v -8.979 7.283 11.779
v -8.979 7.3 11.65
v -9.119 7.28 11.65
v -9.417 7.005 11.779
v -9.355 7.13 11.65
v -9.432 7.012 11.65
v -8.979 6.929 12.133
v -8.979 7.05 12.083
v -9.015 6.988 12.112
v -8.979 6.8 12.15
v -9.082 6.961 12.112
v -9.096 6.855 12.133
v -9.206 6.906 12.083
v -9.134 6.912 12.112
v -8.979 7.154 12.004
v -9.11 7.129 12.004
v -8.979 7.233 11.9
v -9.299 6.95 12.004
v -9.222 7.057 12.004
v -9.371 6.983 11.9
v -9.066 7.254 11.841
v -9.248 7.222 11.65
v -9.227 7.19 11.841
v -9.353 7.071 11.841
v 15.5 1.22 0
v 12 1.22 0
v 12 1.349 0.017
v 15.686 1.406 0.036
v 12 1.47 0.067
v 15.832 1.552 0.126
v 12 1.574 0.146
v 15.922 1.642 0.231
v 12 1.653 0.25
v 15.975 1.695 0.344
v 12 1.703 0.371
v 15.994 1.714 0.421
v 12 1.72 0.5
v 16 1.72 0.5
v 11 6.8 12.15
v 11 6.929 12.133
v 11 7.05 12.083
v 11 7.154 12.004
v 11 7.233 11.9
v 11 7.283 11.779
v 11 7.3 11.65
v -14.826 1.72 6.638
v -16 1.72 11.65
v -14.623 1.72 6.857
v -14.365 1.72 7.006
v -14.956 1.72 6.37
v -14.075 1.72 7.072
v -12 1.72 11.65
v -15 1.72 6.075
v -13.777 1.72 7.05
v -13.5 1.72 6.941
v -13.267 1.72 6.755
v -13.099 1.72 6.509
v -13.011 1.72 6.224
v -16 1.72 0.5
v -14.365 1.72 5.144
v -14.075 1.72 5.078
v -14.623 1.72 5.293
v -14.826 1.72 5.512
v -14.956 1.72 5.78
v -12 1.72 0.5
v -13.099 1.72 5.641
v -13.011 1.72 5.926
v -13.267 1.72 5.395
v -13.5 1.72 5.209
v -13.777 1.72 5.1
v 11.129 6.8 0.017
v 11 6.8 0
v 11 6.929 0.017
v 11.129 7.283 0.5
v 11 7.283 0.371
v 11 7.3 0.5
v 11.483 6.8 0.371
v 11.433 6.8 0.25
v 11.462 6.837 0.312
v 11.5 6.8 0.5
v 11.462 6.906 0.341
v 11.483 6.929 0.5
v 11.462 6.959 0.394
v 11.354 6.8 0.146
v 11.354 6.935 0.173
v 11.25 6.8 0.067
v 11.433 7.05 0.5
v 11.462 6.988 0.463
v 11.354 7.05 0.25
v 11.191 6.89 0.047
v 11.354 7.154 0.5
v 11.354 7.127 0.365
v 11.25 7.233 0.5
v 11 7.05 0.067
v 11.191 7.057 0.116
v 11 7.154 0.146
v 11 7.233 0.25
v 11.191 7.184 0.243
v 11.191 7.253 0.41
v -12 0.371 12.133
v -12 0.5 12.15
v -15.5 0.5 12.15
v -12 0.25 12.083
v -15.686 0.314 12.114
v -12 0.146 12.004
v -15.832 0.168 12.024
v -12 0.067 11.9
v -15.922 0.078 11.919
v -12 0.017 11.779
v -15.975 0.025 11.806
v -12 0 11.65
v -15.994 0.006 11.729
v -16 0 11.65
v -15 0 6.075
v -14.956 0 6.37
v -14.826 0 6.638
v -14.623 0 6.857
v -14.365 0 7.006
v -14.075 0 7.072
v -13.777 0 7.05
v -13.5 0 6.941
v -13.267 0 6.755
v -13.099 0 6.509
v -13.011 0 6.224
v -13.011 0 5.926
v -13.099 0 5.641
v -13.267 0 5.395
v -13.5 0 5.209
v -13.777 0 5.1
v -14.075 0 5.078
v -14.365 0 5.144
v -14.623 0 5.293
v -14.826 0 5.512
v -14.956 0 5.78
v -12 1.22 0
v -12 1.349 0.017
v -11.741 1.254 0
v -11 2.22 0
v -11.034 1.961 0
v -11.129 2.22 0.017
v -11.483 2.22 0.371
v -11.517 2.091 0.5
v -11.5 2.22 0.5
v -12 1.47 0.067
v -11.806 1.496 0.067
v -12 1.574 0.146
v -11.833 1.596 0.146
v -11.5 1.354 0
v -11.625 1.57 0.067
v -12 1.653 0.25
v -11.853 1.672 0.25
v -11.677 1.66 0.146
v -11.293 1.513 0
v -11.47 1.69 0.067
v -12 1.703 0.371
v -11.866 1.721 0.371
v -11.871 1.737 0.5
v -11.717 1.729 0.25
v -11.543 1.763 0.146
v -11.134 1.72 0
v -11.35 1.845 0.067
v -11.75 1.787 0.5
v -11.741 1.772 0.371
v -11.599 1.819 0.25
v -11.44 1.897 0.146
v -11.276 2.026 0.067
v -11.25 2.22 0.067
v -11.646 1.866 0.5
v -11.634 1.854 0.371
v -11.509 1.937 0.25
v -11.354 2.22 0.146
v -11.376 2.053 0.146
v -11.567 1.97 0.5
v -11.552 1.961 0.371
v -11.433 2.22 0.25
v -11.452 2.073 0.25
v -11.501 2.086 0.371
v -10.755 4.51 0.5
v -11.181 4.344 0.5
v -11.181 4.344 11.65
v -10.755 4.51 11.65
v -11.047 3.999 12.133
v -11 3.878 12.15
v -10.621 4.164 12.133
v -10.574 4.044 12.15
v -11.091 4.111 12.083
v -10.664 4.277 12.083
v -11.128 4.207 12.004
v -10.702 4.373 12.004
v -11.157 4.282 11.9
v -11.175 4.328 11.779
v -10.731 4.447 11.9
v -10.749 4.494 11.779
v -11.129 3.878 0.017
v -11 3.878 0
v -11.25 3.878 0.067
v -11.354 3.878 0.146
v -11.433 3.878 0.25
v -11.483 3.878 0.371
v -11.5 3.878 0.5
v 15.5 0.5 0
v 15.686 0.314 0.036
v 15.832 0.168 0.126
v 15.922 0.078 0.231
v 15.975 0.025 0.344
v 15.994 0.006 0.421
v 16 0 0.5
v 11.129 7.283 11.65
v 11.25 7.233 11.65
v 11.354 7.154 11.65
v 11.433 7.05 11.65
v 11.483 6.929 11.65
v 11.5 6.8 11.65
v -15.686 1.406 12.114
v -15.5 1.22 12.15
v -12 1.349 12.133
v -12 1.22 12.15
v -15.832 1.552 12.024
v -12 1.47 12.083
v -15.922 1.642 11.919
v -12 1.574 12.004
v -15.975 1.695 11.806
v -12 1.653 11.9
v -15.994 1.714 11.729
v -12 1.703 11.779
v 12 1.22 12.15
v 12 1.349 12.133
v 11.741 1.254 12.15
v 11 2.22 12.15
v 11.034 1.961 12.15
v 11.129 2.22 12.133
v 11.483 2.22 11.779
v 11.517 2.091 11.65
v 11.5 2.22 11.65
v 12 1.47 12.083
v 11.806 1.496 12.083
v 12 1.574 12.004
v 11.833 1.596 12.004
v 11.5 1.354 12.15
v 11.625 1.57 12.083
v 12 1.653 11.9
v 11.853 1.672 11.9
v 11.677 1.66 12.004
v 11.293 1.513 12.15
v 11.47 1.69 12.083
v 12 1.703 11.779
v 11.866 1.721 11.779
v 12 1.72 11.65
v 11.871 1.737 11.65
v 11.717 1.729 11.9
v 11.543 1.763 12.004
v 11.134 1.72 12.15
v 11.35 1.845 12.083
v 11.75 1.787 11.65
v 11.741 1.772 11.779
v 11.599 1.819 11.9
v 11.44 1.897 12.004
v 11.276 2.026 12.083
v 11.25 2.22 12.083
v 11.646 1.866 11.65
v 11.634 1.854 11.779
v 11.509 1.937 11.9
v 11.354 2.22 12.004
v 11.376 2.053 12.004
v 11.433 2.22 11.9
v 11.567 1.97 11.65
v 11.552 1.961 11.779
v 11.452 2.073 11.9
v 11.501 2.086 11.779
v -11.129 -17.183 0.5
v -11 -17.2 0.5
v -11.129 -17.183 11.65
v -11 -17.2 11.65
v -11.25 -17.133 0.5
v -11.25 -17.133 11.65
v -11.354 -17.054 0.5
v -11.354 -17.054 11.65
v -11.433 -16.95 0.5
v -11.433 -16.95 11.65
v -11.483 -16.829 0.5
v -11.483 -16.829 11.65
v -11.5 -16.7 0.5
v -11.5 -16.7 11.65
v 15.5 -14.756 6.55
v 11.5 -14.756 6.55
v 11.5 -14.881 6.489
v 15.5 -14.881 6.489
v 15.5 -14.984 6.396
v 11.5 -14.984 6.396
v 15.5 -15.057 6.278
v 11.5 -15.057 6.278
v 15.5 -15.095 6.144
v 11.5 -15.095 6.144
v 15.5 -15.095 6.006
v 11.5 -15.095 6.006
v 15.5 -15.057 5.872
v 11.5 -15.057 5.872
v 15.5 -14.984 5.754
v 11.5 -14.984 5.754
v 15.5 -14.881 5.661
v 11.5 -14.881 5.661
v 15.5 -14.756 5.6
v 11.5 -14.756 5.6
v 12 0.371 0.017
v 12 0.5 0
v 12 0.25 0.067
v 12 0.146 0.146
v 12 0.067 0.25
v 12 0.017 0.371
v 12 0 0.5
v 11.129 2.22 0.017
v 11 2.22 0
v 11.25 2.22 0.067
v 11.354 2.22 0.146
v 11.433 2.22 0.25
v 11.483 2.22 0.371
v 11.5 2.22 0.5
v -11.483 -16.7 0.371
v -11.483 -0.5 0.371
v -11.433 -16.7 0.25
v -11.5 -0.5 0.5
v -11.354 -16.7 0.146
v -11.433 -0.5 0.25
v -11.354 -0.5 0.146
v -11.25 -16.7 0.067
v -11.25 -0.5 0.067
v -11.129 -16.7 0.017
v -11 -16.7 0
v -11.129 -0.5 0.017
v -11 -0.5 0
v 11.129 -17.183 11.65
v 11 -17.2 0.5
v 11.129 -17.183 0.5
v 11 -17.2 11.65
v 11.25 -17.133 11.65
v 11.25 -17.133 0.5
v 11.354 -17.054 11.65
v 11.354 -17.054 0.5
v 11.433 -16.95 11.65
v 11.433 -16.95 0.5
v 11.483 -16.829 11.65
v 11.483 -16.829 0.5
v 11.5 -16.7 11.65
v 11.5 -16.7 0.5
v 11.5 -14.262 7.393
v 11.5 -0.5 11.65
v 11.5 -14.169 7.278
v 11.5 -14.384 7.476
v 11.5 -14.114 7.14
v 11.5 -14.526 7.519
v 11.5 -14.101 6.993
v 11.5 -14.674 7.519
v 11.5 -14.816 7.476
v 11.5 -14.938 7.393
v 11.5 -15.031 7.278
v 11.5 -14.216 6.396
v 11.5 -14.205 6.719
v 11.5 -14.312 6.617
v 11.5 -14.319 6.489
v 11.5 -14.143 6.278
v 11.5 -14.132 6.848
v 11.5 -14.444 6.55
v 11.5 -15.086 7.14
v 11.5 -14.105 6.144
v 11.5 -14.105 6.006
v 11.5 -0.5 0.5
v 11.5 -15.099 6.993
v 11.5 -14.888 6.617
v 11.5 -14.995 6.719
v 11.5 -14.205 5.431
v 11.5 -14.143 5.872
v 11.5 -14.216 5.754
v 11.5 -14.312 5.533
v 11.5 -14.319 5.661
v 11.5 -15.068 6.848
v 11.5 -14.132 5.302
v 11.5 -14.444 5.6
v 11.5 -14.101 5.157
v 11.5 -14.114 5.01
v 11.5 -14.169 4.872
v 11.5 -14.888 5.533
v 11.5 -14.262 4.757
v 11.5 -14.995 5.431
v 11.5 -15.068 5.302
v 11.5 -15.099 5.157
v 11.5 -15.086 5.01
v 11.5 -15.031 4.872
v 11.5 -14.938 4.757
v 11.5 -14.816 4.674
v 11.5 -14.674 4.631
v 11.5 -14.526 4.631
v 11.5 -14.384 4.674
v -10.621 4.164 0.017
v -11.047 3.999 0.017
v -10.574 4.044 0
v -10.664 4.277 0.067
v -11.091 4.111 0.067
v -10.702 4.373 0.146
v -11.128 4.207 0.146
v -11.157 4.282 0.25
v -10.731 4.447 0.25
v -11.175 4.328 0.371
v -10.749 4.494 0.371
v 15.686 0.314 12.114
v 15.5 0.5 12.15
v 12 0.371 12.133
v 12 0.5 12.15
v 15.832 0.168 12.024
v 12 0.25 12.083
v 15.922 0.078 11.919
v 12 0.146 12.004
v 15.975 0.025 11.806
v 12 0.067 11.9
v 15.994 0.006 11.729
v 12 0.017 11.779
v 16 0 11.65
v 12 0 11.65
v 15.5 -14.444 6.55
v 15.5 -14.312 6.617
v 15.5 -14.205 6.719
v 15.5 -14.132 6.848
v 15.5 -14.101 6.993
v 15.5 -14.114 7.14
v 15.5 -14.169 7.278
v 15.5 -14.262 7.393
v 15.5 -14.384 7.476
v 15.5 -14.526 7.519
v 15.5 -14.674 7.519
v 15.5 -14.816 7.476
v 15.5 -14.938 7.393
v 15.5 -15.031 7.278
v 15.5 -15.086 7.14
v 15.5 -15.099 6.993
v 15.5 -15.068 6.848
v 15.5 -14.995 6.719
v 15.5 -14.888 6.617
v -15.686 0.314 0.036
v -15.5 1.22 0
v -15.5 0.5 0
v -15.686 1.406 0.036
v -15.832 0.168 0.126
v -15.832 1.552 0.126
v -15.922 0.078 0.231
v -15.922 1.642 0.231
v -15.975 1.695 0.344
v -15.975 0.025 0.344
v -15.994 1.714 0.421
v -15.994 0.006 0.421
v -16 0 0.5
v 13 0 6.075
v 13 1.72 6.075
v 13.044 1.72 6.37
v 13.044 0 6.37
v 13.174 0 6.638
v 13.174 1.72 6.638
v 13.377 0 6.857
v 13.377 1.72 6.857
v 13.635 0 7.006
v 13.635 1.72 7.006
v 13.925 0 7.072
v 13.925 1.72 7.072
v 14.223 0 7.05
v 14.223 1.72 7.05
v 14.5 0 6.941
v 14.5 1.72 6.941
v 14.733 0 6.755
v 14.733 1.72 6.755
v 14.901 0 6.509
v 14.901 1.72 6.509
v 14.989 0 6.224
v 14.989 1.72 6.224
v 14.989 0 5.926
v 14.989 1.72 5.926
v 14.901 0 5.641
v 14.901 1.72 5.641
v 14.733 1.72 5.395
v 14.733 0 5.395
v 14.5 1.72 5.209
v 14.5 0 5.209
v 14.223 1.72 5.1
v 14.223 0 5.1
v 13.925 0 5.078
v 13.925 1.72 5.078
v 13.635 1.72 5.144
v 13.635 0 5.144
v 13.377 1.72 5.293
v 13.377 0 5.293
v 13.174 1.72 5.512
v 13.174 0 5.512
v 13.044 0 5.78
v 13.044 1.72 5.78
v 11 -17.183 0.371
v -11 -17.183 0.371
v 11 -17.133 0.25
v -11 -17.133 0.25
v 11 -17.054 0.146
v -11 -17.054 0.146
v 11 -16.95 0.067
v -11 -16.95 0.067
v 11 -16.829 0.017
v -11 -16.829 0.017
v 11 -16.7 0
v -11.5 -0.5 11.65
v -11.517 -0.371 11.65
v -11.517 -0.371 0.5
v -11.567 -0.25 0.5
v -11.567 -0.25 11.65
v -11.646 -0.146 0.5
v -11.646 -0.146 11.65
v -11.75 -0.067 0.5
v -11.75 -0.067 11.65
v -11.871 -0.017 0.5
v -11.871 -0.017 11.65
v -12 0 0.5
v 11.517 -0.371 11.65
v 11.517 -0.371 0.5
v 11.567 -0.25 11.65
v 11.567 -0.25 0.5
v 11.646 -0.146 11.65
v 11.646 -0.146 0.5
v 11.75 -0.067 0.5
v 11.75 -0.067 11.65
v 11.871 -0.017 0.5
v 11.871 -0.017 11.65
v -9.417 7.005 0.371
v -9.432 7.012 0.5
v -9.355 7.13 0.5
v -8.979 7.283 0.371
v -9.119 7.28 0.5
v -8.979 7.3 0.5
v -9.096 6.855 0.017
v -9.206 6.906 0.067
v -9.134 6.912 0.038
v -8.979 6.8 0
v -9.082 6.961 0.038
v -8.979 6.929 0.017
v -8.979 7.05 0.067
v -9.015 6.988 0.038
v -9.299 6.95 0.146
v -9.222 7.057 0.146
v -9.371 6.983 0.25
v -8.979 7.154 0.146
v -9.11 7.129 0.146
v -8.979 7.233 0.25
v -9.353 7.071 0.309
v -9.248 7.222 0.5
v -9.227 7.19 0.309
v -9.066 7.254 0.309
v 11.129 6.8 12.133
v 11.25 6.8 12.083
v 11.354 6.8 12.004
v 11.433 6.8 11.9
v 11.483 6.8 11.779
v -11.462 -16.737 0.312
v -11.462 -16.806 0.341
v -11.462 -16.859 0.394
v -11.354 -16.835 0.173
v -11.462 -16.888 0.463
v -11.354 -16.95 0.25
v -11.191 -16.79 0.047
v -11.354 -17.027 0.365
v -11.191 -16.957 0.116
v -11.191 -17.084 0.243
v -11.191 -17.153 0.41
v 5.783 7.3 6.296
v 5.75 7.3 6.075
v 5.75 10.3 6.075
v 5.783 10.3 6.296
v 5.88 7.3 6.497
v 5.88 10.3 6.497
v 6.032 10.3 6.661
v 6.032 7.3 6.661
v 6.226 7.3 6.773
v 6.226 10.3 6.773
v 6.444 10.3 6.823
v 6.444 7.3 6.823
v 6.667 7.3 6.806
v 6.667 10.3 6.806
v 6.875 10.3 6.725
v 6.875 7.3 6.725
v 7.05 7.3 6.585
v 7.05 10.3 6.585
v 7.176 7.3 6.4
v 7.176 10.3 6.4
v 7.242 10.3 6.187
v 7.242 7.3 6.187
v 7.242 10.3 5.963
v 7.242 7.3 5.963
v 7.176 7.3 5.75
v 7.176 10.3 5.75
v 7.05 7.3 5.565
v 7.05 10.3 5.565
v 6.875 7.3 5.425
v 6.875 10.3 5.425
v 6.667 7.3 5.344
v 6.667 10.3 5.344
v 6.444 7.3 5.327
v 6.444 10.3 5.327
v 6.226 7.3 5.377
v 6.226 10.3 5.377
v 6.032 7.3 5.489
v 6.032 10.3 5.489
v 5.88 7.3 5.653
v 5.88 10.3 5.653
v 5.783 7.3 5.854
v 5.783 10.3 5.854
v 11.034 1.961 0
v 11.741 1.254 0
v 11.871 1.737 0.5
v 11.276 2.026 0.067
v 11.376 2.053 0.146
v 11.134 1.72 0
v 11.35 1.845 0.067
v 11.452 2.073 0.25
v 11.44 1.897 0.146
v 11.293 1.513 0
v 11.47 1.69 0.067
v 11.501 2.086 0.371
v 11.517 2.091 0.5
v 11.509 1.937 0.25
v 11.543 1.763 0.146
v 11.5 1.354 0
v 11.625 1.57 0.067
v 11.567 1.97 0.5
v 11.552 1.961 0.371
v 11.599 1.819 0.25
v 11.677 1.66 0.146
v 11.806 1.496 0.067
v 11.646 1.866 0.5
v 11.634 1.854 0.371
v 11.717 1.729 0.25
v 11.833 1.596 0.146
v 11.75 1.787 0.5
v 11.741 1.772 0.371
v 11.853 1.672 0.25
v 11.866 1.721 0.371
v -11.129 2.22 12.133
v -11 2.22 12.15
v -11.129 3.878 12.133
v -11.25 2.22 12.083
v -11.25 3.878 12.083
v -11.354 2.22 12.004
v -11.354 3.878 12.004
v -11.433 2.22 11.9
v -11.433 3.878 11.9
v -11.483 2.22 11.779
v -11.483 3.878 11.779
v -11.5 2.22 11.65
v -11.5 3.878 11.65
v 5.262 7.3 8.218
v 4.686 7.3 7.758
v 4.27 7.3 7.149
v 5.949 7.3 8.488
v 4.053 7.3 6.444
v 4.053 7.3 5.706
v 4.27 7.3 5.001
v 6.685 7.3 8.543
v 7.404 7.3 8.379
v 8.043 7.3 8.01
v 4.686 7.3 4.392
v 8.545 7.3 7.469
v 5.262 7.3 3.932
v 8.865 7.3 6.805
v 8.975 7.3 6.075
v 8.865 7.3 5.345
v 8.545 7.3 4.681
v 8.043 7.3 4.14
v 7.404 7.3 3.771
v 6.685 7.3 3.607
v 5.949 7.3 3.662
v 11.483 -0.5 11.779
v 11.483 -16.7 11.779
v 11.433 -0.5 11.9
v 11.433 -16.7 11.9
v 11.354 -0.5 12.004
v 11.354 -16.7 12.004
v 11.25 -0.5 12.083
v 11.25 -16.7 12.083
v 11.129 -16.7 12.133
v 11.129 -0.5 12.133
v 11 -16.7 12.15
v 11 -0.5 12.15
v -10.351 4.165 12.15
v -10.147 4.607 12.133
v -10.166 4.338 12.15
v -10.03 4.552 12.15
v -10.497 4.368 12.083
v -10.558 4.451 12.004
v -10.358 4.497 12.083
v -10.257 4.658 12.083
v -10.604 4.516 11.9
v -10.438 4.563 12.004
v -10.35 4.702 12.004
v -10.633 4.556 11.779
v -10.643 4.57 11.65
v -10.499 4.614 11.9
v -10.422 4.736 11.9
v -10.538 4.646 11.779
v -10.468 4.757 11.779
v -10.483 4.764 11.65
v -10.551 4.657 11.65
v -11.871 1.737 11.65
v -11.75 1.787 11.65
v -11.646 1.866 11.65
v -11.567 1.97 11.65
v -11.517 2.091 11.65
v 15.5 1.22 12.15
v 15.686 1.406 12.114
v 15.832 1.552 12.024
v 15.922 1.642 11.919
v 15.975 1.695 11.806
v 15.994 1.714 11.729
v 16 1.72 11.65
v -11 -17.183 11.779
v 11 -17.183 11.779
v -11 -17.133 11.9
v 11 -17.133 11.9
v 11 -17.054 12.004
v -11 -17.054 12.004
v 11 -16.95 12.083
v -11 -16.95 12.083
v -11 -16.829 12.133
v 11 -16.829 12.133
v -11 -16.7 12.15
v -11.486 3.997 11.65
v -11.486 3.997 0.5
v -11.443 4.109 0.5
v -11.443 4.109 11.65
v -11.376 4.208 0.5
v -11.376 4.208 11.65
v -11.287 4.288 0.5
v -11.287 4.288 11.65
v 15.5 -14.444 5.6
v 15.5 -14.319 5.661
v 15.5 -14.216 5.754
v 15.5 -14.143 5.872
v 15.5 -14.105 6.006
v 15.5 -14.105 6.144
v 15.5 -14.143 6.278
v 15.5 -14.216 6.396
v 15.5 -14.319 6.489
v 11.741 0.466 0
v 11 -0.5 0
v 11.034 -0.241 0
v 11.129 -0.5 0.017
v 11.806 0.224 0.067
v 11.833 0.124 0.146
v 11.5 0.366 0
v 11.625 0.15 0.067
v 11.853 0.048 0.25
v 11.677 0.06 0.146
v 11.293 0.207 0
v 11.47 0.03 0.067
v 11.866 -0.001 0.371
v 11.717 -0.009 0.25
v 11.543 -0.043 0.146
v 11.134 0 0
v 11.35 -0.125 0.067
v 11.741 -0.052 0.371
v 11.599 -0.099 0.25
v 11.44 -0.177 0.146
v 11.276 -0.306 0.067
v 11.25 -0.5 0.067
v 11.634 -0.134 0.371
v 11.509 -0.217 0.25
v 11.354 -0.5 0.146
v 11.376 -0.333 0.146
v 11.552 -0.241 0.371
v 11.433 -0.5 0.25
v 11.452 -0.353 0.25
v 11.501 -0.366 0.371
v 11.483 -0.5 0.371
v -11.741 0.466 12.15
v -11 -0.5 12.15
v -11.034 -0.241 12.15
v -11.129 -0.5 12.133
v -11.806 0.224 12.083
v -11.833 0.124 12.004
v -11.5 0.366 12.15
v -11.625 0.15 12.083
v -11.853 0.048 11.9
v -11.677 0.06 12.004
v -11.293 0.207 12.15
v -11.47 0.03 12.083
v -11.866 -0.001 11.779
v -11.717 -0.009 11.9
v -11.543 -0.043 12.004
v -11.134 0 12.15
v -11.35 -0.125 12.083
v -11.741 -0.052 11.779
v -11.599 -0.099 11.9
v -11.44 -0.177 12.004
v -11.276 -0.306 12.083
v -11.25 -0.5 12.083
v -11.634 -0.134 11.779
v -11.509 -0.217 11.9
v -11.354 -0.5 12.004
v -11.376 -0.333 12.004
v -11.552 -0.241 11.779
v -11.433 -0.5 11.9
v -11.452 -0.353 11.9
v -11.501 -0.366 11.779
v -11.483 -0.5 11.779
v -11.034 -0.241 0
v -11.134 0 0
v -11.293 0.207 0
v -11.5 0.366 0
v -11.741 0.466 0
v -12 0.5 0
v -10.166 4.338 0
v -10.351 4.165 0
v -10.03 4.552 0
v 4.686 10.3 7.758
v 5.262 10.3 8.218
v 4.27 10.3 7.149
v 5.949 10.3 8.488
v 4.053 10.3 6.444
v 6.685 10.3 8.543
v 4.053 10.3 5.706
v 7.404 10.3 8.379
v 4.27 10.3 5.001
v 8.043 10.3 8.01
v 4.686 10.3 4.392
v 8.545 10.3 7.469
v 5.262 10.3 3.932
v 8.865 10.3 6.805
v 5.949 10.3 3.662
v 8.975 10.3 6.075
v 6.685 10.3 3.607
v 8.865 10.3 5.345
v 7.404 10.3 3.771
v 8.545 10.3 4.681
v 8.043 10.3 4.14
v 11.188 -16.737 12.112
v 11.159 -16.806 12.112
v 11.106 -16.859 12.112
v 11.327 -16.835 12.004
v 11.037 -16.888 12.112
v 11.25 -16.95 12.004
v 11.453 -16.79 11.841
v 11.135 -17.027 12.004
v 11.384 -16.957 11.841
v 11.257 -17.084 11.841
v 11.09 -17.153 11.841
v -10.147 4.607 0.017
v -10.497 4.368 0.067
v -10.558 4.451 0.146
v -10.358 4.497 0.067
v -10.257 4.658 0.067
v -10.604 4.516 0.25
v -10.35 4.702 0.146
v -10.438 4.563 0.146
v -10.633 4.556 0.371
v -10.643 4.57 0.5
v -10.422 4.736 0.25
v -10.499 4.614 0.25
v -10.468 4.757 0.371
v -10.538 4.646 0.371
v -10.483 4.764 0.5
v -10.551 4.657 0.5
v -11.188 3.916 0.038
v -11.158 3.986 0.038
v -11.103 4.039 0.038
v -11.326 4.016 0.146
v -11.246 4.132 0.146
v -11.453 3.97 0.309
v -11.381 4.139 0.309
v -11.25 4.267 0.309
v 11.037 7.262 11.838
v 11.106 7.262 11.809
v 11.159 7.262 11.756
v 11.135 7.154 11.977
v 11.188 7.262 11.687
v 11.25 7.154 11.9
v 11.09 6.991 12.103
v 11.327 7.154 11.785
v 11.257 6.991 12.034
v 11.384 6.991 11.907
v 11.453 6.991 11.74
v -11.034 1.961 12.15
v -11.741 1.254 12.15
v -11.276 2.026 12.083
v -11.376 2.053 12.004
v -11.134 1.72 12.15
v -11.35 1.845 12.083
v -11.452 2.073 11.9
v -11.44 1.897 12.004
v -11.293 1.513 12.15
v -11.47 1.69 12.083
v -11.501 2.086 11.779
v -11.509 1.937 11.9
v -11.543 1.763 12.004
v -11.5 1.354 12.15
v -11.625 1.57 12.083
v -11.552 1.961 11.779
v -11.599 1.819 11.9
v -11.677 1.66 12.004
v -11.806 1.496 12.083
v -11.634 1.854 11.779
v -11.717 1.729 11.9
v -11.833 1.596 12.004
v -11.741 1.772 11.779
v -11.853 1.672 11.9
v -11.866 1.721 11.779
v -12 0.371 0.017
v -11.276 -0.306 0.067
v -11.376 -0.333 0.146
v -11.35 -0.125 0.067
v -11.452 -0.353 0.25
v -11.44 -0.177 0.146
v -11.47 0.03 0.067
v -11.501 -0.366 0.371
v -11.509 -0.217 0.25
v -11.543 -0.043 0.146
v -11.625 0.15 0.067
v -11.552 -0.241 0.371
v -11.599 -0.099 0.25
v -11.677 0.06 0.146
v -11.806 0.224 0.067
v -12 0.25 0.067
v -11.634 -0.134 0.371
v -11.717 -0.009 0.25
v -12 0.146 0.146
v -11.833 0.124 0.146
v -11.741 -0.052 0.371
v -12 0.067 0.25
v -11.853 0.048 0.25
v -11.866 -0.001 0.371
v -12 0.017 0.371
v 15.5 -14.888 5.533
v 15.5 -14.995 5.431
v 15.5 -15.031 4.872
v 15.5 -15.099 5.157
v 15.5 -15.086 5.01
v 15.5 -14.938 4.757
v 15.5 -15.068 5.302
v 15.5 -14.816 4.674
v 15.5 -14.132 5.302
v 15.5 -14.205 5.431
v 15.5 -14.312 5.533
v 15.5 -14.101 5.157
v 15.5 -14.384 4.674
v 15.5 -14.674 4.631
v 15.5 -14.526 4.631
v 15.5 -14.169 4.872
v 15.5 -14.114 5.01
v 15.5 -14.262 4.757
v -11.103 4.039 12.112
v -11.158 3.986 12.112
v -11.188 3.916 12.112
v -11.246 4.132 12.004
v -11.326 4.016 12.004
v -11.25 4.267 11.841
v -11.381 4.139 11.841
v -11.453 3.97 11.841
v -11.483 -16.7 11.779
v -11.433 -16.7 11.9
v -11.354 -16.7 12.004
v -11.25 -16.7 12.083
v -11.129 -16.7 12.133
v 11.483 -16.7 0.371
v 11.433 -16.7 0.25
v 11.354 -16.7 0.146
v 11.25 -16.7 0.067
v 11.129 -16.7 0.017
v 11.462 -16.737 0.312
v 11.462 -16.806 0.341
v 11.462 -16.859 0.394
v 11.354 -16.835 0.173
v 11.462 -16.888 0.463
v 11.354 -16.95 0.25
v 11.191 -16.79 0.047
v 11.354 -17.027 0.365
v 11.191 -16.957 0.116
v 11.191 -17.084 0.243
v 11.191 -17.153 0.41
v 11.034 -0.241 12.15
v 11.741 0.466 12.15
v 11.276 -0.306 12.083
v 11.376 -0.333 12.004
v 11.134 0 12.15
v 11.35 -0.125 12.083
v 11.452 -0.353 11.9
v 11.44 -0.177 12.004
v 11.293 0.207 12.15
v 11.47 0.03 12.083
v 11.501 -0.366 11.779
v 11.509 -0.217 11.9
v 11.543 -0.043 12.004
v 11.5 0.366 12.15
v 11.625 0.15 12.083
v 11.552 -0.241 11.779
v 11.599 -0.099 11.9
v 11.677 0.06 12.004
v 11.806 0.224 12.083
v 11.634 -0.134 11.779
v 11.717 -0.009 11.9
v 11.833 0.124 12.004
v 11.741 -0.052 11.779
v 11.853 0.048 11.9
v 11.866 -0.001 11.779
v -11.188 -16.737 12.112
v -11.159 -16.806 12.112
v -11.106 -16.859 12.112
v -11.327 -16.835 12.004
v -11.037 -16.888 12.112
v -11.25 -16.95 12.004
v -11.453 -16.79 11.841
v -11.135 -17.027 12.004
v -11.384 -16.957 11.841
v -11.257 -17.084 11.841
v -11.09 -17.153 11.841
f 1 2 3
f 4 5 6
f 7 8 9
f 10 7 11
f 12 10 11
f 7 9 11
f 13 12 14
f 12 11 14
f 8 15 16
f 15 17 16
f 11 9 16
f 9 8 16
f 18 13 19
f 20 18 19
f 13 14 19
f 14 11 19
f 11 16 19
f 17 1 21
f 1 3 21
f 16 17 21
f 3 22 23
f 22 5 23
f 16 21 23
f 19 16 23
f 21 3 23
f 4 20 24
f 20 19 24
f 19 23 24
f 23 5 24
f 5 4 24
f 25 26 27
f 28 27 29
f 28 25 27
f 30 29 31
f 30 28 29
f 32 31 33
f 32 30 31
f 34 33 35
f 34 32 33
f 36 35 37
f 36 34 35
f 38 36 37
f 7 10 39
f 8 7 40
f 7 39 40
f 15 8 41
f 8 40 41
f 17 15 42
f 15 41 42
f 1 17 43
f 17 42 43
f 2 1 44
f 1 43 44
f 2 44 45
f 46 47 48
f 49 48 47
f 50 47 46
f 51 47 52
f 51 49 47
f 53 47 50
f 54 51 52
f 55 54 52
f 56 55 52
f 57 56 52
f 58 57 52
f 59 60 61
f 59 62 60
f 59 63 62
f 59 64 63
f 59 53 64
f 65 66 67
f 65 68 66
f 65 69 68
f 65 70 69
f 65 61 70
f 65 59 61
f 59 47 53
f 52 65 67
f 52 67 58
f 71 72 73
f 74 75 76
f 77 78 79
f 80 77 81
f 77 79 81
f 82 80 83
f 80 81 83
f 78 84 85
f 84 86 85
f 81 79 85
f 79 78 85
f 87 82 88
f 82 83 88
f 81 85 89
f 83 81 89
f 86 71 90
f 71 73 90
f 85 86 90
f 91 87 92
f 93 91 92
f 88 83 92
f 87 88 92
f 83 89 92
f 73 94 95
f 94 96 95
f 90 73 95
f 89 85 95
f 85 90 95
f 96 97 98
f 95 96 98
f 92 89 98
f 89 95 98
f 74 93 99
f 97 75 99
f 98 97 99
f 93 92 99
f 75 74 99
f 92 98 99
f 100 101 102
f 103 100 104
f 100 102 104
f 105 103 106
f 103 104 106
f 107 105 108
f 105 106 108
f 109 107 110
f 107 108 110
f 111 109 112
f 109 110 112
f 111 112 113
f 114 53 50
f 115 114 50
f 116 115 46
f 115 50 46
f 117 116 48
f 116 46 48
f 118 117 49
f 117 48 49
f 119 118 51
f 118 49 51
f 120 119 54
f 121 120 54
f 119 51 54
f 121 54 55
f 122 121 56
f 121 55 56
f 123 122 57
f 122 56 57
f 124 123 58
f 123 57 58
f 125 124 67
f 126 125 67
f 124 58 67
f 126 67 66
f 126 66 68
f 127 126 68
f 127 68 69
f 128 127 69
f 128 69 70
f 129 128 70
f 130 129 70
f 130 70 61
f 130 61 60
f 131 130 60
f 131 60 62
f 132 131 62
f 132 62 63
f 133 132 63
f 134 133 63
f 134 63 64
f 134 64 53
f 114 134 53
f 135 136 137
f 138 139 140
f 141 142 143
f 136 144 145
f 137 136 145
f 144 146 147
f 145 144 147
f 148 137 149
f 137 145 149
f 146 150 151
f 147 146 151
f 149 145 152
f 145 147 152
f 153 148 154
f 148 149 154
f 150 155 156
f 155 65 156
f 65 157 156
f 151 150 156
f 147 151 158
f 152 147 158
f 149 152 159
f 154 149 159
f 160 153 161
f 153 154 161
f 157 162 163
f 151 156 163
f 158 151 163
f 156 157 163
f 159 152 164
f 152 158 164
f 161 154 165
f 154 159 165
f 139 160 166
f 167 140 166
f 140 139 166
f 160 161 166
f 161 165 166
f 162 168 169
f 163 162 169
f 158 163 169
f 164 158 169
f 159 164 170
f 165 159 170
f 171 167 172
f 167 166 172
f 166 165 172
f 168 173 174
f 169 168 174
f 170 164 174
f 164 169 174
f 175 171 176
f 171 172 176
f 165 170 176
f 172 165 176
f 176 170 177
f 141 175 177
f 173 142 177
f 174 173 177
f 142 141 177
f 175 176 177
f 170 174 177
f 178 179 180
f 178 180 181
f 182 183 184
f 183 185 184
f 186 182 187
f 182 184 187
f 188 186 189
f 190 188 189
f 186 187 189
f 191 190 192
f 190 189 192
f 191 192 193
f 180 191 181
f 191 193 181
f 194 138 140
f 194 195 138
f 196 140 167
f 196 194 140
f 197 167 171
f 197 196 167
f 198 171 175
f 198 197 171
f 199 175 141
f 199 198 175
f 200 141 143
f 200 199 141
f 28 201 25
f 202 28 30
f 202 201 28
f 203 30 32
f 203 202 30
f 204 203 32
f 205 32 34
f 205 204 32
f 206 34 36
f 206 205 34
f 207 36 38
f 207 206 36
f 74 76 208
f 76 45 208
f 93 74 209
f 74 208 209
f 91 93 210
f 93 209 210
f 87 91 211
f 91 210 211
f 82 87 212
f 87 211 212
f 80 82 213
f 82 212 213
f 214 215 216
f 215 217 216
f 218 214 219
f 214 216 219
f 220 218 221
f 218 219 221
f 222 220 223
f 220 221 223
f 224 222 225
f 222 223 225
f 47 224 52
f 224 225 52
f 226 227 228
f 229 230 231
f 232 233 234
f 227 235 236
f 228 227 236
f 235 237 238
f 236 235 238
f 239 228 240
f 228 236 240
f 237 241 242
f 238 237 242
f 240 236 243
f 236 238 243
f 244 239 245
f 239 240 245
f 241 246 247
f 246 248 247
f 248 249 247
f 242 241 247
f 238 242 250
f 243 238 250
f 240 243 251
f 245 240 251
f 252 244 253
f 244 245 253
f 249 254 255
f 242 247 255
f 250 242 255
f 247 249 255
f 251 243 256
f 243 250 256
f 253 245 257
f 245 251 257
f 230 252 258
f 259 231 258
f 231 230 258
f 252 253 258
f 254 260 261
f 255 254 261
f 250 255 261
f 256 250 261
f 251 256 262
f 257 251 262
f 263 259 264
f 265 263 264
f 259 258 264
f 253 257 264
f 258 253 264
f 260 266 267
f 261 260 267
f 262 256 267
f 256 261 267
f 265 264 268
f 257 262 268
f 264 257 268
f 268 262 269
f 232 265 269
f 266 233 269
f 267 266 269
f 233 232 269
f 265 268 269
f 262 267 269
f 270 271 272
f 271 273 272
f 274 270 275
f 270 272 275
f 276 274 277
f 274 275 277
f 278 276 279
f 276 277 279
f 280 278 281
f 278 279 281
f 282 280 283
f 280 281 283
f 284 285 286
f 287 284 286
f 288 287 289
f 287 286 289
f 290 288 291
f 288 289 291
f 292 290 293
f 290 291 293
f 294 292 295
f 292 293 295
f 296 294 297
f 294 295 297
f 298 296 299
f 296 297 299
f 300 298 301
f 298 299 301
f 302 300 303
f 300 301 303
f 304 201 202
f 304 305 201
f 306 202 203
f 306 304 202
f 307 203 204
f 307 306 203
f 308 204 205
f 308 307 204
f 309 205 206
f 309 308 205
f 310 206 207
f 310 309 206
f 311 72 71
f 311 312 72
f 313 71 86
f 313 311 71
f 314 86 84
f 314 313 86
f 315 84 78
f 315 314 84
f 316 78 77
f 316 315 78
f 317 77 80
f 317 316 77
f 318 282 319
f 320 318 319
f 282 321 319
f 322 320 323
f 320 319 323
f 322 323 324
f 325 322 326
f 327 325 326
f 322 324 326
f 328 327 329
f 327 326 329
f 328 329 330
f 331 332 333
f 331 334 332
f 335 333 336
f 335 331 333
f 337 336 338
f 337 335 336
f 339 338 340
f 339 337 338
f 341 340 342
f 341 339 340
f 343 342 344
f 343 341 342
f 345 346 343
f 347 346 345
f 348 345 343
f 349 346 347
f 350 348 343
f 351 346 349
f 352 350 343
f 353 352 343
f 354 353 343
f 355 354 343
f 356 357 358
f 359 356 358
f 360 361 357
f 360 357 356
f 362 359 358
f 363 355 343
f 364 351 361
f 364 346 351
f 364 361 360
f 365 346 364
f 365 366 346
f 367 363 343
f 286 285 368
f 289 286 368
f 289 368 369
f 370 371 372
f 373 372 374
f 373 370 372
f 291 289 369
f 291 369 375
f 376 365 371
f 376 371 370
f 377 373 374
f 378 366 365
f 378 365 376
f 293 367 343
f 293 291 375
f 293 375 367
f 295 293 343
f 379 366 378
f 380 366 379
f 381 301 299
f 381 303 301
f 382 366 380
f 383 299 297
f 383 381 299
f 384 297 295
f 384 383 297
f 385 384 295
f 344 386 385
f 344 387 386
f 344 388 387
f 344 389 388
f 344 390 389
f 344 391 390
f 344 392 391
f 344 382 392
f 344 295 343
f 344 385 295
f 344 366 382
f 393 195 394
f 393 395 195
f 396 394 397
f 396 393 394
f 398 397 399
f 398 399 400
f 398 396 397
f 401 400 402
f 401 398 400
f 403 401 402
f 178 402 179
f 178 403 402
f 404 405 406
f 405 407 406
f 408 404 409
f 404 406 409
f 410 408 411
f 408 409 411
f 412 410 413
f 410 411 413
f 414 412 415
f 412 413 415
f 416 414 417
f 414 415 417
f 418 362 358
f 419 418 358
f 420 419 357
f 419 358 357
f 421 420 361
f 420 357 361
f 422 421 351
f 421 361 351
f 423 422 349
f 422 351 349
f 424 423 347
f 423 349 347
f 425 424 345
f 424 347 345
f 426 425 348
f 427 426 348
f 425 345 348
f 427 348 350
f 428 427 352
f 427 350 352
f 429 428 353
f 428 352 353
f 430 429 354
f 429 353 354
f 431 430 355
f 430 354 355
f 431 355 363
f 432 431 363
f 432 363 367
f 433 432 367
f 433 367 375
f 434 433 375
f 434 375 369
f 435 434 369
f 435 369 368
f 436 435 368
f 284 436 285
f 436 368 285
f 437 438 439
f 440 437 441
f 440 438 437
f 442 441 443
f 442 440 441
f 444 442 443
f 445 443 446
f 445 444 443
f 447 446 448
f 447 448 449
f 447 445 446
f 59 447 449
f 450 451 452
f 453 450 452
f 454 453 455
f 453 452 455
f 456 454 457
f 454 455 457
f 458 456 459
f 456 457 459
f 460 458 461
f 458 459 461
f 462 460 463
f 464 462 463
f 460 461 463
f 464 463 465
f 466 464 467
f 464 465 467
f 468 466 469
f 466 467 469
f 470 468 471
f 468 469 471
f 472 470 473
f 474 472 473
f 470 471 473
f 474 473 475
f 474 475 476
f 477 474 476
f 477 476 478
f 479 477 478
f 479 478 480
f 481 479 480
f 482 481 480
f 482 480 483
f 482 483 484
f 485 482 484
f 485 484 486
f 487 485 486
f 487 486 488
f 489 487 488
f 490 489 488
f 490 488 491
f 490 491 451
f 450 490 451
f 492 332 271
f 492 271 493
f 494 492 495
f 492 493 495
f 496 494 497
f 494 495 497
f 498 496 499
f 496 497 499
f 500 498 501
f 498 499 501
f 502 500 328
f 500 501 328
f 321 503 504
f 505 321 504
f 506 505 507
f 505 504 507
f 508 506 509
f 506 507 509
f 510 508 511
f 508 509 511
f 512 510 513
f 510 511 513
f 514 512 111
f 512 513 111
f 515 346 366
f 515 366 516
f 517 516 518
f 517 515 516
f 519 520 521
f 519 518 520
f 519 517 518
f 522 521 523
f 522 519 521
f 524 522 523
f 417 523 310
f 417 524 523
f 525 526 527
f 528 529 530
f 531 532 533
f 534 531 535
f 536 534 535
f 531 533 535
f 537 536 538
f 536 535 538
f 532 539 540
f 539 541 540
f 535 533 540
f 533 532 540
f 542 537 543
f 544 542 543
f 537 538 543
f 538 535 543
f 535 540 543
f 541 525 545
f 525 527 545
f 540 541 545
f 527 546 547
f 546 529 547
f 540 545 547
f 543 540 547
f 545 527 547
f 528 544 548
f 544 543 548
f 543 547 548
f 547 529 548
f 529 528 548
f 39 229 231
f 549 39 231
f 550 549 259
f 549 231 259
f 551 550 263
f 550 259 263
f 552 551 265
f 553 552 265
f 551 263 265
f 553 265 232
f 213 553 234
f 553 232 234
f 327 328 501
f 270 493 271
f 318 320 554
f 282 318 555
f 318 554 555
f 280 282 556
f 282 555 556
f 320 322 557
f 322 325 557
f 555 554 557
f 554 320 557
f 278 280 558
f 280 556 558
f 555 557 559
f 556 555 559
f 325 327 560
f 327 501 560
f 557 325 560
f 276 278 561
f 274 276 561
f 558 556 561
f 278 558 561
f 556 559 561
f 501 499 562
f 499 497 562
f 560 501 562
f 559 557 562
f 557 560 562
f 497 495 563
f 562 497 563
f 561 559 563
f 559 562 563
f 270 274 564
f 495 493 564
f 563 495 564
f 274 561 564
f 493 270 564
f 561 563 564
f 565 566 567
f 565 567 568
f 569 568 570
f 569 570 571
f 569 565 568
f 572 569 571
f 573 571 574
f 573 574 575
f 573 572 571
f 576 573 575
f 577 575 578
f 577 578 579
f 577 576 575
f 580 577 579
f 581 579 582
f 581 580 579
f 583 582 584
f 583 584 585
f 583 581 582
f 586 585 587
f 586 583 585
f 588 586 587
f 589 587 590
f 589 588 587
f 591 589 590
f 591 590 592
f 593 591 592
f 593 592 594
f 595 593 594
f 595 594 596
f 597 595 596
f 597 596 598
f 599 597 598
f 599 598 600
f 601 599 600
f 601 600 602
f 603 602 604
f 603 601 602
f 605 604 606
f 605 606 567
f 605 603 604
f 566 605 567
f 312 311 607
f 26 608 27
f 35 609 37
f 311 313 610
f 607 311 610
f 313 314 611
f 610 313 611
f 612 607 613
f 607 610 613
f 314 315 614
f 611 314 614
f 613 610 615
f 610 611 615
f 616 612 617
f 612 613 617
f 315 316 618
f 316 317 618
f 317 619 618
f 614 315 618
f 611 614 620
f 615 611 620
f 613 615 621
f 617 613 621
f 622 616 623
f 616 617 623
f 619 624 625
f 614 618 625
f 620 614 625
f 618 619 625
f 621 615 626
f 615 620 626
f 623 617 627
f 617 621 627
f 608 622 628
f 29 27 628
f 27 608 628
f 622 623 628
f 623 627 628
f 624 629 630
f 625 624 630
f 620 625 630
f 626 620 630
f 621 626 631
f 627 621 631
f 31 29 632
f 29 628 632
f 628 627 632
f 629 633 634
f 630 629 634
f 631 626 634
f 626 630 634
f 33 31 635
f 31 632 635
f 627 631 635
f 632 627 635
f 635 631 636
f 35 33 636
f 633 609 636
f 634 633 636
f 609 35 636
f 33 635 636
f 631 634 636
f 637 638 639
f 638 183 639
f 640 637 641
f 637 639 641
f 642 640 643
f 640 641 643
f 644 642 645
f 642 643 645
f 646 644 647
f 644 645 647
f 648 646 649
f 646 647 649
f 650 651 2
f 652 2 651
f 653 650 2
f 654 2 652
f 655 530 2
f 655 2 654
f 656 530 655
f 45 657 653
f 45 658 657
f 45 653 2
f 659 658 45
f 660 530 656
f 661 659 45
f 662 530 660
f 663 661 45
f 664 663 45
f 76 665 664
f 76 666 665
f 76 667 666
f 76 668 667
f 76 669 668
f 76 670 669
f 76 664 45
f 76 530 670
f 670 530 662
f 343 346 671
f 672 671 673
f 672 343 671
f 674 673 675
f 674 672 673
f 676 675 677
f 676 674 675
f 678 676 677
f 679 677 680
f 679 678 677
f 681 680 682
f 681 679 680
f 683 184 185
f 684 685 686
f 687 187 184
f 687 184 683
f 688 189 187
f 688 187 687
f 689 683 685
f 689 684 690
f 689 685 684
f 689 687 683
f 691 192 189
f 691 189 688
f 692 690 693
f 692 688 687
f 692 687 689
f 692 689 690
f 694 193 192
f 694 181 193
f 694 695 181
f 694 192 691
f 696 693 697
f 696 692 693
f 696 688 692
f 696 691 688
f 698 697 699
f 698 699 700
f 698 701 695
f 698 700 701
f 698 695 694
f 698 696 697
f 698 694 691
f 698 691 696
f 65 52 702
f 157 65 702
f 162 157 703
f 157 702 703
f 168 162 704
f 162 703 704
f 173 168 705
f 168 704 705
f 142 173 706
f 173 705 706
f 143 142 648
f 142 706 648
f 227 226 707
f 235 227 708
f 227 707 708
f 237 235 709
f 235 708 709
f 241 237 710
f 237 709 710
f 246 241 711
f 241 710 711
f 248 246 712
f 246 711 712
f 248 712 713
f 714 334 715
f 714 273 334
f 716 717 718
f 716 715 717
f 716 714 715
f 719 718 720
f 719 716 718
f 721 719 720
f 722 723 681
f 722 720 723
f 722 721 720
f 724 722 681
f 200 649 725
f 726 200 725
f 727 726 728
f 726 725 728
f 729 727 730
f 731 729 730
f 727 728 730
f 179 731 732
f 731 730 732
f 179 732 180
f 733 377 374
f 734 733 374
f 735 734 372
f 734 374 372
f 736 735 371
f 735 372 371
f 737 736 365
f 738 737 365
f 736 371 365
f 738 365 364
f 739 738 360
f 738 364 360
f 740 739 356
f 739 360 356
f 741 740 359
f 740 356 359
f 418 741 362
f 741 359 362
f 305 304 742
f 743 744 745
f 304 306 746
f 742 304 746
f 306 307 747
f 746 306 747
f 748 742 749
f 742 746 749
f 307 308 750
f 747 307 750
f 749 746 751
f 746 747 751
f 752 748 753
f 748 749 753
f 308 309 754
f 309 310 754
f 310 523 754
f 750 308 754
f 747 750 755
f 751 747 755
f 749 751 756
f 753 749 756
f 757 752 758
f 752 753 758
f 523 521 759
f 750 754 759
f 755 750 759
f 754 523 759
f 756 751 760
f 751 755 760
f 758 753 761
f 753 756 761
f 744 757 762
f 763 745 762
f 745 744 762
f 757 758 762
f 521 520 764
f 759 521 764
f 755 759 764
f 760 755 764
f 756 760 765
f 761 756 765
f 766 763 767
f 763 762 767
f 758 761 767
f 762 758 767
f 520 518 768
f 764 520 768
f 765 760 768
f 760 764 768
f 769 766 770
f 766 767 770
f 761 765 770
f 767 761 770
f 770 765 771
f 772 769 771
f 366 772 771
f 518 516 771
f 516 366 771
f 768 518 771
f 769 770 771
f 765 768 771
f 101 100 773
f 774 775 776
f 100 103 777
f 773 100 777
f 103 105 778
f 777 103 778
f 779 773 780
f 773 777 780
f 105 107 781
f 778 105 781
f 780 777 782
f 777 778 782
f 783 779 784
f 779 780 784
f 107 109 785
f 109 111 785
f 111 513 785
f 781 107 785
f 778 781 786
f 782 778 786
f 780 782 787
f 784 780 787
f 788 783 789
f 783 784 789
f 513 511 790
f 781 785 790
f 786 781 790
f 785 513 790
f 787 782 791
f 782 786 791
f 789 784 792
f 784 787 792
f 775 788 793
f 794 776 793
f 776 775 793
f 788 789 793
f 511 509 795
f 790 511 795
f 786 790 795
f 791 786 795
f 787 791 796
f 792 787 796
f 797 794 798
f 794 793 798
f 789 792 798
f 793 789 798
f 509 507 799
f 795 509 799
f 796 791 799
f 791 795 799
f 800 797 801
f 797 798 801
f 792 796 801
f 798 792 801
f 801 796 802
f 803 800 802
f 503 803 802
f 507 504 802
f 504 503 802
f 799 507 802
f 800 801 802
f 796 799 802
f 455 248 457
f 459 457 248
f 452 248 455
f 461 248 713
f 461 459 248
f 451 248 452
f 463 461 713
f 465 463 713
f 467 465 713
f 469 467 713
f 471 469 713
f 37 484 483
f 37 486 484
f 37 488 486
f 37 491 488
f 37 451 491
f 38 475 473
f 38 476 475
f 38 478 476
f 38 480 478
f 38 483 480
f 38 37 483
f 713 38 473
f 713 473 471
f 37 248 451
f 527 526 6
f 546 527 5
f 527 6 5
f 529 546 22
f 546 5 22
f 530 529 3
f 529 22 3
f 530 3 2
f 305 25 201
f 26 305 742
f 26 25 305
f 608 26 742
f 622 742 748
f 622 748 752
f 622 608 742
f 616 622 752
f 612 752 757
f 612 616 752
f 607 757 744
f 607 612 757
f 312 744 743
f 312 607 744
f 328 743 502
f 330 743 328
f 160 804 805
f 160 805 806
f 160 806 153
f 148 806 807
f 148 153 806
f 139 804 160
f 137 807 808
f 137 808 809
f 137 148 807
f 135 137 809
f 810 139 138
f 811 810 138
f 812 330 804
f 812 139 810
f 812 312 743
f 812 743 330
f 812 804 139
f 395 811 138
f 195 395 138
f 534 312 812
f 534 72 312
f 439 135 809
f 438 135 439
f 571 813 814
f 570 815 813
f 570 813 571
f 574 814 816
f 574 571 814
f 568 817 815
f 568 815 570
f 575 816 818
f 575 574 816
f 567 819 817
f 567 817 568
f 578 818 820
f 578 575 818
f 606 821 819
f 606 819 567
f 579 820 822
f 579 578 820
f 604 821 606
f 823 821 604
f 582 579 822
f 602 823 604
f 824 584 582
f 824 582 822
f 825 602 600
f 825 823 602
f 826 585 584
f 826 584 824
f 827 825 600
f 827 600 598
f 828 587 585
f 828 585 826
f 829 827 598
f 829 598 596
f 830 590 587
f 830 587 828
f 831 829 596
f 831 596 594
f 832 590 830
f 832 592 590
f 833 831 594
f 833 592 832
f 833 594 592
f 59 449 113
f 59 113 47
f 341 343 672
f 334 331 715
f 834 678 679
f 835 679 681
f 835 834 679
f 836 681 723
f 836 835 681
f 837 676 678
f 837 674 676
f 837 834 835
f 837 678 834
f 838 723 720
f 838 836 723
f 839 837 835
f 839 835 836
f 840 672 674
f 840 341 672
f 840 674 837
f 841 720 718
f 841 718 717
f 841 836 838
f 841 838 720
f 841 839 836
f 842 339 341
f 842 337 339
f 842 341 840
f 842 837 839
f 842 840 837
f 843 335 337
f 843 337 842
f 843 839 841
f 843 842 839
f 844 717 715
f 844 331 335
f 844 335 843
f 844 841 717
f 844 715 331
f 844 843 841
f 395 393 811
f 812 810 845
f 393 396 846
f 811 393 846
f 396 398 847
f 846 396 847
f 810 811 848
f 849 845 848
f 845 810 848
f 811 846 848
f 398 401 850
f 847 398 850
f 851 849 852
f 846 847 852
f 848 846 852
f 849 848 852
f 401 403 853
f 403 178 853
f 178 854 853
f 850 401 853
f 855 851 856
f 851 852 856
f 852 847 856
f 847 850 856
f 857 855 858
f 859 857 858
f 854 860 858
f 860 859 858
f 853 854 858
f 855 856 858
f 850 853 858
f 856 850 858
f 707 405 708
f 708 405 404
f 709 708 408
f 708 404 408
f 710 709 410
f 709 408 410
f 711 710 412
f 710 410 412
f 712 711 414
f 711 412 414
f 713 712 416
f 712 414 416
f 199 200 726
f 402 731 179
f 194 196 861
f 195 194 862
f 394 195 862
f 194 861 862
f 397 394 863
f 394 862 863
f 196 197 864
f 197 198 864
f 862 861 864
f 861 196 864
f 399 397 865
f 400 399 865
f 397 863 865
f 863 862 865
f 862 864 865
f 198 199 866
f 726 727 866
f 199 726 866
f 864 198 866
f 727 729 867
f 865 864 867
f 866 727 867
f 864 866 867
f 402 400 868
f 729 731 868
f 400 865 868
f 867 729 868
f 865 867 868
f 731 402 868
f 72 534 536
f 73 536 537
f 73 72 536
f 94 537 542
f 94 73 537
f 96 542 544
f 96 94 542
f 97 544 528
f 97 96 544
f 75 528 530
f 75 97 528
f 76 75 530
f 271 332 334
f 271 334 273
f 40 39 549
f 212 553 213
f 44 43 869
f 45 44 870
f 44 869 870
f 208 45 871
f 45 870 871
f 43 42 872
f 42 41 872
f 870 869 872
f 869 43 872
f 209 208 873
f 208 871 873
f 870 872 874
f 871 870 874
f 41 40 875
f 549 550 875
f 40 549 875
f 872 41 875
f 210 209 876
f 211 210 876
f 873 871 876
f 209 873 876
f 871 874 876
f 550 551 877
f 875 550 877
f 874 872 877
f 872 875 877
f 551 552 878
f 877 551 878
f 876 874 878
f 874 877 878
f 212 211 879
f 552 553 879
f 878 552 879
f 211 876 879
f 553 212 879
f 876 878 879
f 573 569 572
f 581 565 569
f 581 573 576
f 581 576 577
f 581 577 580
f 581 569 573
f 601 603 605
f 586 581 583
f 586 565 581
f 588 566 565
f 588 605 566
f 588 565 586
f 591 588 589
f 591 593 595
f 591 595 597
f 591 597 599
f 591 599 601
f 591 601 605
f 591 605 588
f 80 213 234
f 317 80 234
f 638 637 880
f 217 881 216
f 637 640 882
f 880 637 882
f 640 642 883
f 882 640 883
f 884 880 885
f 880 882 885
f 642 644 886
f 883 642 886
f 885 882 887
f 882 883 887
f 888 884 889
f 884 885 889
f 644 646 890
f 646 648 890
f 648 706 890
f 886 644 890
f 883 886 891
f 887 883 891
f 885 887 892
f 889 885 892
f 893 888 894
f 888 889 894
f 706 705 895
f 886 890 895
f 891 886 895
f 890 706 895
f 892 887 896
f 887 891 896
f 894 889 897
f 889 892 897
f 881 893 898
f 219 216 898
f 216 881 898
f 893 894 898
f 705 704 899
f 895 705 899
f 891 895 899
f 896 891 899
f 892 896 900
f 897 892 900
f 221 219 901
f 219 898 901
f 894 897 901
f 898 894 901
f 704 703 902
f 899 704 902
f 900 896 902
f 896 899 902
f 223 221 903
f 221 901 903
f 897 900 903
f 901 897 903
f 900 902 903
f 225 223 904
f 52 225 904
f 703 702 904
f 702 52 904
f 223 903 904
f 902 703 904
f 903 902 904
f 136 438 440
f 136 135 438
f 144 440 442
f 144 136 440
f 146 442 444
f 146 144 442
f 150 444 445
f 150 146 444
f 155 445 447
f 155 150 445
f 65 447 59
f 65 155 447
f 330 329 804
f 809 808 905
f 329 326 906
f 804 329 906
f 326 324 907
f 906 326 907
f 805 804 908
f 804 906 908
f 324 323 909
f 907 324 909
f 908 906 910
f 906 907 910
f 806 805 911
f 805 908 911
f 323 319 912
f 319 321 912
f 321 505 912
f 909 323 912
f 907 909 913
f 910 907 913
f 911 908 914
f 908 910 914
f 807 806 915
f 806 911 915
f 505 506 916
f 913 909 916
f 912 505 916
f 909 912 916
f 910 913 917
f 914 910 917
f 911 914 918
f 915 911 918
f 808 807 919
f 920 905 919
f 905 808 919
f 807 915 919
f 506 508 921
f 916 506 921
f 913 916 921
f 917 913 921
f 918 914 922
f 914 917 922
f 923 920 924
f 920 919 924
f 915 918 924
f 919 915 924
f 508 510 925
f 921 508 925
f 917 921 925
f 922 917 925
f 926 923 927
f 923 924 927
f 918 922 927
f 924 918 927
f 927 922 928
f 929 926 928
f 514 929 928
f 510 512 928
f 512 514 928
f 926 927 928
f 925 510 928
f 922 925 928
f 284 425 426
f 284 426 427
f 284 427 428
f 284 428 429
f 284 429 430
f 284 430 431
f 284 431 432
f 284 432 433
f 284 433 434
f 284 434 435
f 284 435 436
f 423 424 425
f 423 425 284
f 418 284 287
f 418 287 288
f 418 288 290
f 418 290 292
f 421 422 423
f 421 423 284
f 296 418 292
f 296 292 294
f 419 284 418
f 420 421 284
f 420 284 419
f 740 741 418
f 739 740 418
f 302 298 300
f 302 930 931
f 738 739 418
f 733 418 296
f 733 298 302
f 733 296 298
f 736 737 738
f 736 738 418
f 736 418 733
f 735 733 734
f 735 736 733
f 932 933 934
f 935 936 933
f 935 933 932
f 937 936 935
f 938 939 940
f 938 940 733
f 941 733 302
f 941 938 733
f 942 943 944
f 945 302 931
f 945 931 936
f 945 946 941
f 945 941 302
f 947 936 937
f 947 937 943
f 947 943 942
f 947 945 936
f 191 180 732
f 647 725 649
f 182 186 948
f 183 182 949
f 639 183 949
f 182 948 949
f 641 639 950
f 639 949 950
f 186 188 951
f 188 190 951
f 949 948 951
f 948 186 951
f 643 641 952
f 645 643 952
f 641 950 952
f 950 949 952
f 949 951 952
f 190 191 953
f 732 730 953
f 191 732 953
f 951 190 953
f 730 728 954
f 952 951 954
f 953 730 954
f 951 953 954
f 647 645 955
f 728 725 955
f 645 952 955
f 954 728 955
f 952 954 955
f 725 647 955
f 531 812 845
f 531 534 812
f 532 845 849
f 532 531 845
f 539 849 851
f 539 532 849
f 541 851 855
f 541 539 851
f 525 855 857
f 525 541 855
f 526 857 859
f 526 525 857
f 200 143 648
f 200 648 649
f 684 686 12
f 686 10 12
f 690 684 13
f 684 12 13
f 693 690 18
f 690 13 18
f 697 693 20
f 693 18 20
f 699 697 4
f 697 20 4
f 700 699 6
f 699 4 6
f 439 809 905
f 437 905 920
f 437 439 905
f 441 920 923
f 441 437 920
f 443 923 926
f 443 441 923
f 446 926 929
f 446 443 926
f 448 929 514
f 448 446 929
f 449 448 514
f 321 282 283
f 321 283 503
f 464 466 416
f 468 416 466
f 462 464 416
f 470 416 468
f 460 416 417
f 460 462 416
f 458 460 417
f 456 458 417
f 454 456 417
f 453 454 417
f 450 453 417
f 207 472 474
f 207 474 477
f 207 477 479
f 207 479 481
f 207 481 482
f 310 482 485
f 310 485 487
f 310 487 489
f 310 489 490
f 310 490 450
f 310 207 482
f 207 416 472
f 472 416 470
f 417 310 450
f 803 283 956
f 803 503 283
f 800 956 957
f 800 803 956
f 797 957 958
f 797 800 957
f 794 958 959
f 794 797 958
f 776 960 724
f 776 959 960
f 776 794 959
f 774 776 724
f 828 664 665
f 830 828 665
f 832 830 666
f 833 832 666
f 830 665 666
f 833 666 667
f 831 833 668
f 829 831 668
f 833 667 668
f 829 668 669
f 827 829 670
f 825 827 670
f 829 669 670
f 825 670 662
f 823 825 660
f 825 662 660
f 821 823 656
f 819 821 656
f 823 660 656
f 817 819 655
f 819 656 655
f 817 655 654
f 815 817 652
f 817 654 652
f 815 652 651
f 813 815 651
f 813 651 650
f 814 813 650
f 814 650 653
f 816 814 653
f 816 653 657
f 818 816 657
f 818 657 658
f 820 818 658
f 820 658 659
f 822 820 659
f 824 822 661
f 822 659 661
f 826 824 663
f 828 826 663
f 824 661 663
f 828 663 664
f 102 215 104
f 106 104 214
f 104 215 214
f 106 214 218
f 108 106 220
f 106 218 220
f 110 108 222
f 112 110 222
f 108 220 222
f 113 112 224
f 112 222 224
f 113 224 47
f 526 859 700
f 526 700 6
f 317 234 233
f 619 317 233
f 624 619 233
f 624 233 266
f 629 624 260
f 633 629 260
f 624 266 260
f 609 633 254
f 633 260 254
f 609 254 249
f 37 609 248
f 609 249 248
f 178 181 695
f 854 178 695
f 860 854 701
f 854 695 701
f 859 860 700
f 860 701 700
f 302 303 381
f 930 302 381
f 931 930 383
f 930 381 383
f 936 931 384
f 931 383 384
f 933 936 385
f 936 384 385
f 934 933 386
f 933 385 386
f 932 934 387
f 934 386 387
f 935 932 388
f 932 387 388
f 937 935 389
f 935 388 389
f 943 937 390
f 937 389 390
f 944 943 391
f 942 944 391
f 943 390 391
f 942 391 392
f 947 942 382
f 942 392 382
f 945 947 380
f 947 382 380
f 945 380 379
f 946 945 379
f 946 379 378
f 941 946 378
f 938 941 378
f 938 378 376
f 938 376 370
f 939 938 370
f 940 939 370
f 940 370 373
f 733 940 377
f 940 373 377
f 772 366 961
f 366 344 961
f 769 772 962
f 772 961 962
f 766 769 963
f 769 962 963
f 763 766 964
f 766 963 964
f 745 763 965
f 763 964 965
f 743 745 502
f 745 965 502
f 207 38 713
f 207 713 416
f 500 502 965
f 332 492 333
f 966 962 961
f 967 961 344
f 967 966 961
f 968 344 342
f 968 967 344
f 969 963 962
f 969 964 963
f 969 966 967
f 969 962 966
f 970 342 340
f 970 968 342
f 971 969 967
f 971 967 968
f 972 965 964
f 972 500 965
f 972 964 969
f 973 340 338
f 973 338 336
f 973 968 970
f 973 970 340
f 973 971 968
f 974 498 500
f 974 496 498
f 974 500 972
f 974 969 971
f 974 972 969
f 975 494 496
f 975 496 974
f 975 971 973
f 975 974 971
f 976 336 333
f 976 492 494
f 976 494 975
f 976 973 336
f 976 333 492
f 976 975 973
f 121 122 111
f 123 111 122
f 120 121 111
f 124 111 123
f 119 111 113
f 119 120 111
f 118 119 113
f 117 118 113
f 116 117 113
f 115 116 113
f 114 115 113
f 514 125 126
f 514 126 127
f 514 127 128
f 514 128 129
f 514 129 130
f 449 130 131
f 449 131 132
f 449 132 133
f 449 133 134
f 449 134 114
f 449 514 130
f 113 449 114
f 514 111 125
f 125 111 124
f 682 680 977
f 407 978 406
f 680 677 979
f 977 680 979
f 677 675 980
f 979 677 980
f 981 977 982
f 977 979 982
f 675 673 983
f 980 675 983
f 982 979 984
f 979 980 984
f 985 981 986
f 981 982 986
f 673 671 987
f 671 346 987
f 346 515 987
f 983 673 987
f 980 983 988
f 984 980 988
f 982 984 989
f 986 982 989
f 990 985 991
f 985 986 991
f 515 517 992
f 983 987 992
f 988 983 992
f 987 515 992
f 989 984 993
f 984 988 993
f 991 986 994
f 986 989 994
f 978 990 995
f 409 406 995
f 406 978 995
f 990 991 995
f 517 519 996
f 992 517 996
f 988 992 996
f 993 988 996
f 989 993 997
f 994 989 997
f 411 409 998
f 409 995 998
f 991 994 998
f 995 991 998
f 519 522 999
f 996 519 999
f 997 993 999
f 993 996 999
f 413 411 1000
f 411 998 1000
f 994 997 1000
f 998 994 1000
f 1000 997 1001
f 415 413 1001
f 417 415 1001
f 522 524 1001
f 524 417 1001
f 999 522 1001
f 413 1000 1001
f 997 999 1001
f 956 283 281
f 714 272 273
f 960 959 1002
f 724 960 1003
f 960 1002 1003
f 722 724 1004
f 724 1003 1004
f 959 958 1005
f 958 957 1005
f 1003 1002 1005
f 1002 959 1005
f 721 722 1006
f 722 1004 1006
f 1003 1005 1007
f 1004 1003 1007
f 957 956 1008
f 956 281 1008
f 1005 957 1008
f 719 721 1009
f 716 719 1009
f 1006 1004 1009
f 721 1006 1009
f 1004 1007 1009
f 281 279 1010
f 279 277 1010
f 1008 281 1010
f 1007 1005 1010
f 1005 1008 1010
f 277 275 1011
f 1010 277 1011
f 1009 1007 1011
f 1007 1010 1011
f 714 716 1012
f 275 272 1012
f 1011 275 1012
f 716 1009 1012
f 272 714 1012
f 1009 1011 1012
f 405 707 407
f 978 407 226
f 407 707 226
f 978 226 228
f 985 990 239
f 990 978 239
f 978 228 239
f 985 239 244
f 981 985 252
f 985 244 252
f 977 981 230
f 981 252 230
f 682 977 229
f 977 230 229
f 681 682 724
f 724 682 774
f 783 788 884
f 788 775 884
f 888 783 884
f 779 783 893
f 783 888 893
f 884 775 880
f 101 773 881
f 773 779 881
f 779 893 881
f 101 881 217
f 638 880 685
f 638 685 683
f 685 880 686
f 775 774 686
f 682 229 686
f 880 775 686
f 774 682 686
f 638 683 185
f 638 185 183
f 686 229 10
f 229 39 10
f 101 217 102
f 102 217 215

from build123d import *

# Parameters (mm, degrees)
BOSS_EXTRU_1_DEPTH      = 12.15
ESQUISSE2_R             = 1
ENL_V_MAT_EXTRU_1_DEPTH = 28.596900188
ESQUISSE4_R             = 0.5
BOSS_EXTRU_4_DEPTH      = 4
ESQUISSE5_R             = 2.475
ESQUISSE5_R_2           = 0.75
BOSS_EXTRU_5_DEPTH      = 3
CONG_1_R                = 0.5


with BuildPart() as part:
    # Esquisse1 → Boss.-Extru.1 (new body)
    with BuildSketch(Plane.XY):
        Polygon((11.5, -17.2), (-11.5, -17.2), (-11.5, 0), (-16, 0), (-16, 1.72), (-11.5, 1.72), (-11.5, 4.22), (-10.567959043, 4.582352941), (-9.297370807, 7.3), (11.5, 7.3), (11.5, 1.72), (16, 1.72), (16, 0), (11.5, 0), align=None)
    extrude(amount=BOSS_EXTRU_1_DEPTH)

    # Esquisse2 → Enlèv. mat.-Extru.1 (cut, through all)
    with BuildSketch(Plane(origin=(0, 1.72, 0), x_dir=(1, 0, 0), z_dir=(0, 1, 0))):
        with Locations(Location((-14, -6.075, 0), (0, 0, 180))):
            Circle(ESQUISSE2_R)
        with Locations(Location((14, -6.075, 0), (0, 0, 180))):
            Circle(ESQUISSE2_R)
    extrude(amount=-ENL_V_MAT_EXTRU_1_DEPTH, mode=Mode.SUBTRACT)

    # Esquisse4 → Boss.-Extru.4 (add)
    with BuildSketch(Plane(origin=(11.5, 0, 0), x_dir=(0, 0, -1), z_dir=(1, 0, 0))):
        with Locations((-6.075, -14.6)):
            Circle(ESQUISSE4_R)
        with Locations((-7.025, -14.6)):
            Circle(ESQUISSE4_R)
        with Locations((-5.125, -14.6)):
            Circle(ESQUISSE4_R)
    extrude(amount=BOSS_EXTRU_4_DEPTH)

    # Esquisse5 → Boss.-Extru.5 (add)
    with BuildSketch(Plane(origin=(0, 7.3, 0), x_dir=(1, 0, 0), z_dir=(0, 1, 0))):
        with Locations((6.5, -6.075)):
            Circle(ESQUISSE5_R)
        with Locations(Location((6.5, -6.075, 0), (0, 0, 180))):
            Circle(ESQUISSE5_R_2, mode=Mode.SUBTRACT)
    extrude(amount=BOSS_EXTRU_5_DEPTH)

    # Congé1
    cong_1_edges = [part.edges().sort_by_distance(p)[0] for p in [
        (16, 0.86, 12.15),
        (0, -17.2, 0),
        (-11.5, -8.6, 0),
        (13.75, 1.72, 12.15),
        (-13.75, 0, 0),
        (-16, 0.86, 0),
        (-13.75, 1.72, 0),
        (-11.5, 2.97, 0),
        (-11.033979521, 4.401176471, 0),
        (-9.932664925, 5.941176471, 0),
        (1.101314596, 7.3, 0),
        (11.5, 4.51, 12.15),
        (11.5, 4.51, 0),
        (13.75, 1.72, 0),
        (16, 0.86, 0),
        (13.75, 0, 0),
        (11.5, -8.6, 0),
        (1.101314596, 7.3, 12.15),
        (-9.932664925, 5.941176471, 12.15),
        (11.5, -17.2, 6.075),
        (-11.5, -17.2, 6.075),
        (-11.5, 0, 6.075),
        (-11.5, 1.72, 6.075),
        (-11.5, 4.22, 6.075),
        (-10.567959043, 4.582352941, 6.075),
        (-9.297370807, 7.3, 6.075),
        (11.5, 7.3, 6.075),
        (11.5, 1.72, 6.075),
        (11.5, 0, 6.075),
        (-11.033979521, 4.401176471, 12.15),
        (-11.5, 2.97, 12.15),
        (-13.75, 1.72, 12.15),
        (-16, 0.86, 12.15),
        (-13.75, 0, 12.15),
        (11.5, -8.6, 12.15),
        (-11.5, -8.6, 12.15),
        (0, -17.2, 12.15),
        (13.75, 0, 12.15),
    ]]
    fillet(cong_1_edges, radius=CONG_1_R)


solid = part.part
